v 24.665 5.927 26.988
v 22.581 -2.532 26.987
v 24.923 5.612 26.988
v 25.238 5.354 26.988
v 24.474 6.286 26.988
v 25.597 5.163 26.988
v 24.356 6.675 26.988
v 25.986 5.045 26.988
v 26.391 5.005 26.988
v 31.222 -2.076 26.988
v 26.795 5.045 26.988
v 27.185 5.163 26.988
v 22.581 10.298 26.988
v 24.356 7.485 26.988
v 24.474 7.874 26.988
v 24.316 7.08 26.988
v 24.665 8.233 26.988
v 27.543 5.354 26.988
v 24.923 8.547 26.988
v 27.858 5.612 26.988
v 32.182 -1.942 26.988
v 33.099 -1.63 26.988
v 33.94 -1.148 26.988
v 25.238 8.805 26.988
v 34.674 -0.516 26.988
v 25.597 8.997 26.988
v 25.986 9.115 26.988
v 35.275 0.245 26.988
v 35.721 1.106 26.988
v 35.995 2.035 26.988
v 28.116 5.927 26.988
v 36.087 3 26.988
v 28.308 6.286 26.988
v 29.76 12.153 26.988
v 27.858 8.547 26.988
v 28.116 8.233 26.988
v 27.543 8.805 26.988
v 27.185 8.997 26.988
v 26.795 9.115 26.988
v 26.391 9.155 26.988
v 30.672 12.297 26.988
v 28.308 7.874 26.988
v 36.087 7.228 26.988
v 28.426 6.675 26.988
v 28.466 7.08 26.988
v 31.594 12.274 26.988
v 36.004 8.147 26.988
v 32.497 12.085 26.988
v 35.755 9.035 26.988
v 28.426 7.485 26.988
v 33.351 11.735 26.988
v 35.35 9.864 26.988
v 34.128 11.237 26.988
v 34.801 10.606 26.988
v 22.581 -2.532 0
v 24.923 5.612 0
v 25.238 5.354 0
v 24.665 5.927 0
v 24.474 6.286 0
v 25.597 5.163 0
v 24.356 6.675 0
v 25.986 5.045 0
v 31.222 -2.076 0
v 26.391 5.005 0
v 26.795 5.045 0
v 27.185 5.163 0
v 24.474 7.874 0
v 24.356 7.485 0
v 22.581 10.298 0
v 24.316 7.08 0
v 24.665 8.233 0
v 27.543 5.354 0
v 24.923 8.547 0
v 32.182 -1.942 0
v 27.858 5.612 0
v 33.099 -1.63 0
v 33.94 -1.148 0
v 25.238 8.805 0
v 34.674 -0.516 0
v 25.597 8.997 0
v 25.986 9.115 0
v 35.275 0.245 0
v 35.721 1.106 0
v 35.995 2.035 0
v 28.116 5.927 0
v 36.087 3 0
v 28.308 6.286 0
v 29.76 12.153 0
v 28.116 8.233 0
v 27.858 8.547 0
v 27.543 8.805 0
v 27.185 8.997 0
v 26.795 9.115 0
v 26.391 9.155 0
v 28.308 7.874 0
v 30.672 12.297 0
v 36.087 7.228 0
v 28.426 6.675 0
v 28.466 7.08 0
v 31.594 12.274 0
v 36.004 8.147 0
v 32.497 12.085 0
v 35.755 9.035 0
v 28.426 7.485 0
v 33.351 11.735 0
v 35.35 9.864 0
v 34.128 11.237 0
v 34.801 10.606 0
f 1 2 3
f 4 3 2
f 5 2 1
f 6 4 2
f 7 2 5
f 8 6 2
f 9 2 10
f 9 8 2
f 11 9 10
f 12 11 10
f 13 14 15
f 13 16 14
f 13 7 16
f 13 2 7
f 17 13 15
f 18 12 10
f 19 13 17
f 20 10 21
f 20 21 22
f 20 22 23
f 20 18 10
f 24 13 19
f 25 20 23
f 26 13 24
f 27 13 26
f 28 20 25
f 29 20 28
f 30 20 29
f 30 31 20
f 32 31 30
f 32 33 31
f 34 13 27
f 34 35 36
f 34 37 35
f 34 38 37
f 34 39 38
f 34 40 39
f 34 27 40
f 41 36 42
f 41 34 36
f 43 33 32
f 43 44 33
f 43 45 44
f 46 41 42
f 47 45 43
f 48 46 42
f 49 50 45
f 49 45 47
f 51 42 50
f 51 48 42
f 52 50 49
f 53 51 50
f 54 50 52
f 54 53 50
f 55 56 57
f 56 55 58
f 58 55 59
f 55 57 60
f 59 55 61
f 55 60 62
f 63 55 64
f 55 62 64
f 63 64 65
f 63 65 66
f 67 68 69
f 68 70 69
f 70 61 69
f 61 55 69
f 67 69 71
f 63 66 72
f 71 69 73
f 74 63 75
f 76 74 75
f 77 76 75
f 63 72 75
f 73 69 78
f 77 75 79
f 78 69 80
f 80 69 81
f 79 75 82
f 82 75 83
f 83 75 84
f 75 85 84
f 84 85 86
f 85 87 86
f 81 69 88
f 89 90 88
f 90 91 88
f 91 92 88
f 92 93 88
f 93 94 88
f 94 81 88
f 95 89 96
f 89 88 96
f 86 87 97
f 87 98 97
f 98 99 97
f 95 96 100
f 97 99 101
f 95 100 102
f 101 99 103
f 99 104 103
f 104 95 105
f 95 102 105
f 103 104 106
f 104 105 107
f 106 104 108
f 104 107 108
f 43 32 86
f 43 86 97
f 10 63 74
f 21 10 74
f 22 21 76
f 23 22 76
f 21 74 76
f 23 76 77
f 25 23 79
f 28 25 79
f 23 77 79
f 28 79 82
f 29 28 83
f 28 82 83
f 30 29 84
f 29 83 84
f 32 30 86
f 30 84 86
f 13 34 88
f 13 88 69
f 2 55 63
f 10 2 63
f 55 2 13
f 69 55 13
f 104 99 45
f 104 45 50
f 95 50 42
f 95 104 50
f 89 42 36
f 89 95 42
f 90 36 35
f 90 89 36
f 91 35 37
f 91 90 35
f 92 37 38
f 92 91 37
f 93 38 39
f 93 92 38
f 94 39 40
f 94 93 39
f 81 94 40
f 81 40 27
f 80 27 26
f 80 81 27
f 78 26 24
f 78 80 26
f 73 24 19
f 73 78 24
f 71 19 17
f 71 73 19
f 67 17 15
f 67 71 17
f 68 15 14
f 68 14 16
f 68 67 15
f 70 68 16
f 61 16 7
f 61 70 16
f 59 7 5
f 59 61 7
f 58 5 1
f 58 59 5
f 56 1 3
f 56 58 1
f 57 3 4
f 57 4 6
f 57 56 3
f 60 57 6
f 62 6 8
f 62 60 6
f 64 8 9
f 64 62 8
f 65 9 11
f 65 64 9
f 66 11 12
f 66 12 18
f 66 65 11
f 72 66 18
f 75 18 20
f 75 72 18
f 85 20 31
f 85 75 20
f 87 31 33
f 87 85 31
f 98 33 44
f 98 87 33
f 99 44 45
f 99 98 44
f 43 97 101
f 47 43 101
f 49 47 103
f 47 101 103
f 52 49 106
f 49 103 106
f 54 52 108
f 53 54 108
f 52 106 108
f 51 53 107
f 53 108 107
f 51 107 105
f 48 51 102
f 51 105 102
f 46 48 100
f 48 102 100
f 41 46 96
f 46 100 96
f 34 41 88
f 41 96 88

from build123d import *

# Parameters (mm, degrees)
SKETCH1_R           = 2.075
BOSS_EXTRUDE1_DEPTH = 26.9875
SKETCH2_W           = 86.364255874
SKETCH2_H           = 34.814742066
CUT_EXTRUDE1_DEPTH  = 47.713127442


with BuildPart() as part:
    # Sketch1 → Boss-Extrude1 (new body)
    with BuildSketch(Plane.XY):
        with BuildLine():
            Line((36.087463381, 2.999957931), (36.087463381, 7.227968589))
            ThreePointArc((36.087463381, 7.227968589), (34.127671177, 11.236796761), (29.760414833, 12.152526428))
            add(Edge.make_bspline(
                [(29.760414833, 12.152526428), (20.104550549, 9.70736649), (4.160634919, 5.361227781), (-17.353300331, -1.599332571), (-25.573599276, -4.860049738), (-35.772390435, -8.549078563), (-32.029323662, -8.160268468)],
                knots=[0.330745029, 0.330745029, 0.330745029, 0.330745029, 0.630725311, 0.824213609, 0.940085477, 1, 1, 1, 1], degree=3))
            add(Edge.make_bspline(
                [(-32.029323662, -8.160268468), (-27.594277811, -7.052683566), (-20.08844374, -6.583461174), (-6.740332369, -4.760965275), (4.869732234, -4.072592428), (18.49447741, -2.742713062), (26.204740163, -2.287162162), (31.22157185, -2.075528013)],
                knots=[0, 0, 0, 0, 0.144322392, 0.237947652, 0.42712275, 0.512831912, 0.67202474, 0.67202474, 0.67202474, 0.67202474], degree=3))
            ThreePointArc((31.22157185, -2.075528013), (34.674483358, -0.515630852), (36.087463381, 2.999957931))
        make_face()
        with Locations((26.390676338, 7.079731532)):
            Circle(SKETCH1_R, mode=Mode.SUBTRACT)
    extrude(amount=BOSS_EXTRUDE1_DEPTH)

    # Sketch2 → Cut-Extrude1 (cut, through all)
    with BuildSketch(Plane.XY.offset(26.9875)):
        with Locations((-20.601451599, -3.276083686)):
            Rectangle(SKETCH2_W, SKETCH2_H)
    extrude(amount=-CUT_EXTRUDE1_DEPTH, mode=Mode.SUBTRACT)


solid = part.part
